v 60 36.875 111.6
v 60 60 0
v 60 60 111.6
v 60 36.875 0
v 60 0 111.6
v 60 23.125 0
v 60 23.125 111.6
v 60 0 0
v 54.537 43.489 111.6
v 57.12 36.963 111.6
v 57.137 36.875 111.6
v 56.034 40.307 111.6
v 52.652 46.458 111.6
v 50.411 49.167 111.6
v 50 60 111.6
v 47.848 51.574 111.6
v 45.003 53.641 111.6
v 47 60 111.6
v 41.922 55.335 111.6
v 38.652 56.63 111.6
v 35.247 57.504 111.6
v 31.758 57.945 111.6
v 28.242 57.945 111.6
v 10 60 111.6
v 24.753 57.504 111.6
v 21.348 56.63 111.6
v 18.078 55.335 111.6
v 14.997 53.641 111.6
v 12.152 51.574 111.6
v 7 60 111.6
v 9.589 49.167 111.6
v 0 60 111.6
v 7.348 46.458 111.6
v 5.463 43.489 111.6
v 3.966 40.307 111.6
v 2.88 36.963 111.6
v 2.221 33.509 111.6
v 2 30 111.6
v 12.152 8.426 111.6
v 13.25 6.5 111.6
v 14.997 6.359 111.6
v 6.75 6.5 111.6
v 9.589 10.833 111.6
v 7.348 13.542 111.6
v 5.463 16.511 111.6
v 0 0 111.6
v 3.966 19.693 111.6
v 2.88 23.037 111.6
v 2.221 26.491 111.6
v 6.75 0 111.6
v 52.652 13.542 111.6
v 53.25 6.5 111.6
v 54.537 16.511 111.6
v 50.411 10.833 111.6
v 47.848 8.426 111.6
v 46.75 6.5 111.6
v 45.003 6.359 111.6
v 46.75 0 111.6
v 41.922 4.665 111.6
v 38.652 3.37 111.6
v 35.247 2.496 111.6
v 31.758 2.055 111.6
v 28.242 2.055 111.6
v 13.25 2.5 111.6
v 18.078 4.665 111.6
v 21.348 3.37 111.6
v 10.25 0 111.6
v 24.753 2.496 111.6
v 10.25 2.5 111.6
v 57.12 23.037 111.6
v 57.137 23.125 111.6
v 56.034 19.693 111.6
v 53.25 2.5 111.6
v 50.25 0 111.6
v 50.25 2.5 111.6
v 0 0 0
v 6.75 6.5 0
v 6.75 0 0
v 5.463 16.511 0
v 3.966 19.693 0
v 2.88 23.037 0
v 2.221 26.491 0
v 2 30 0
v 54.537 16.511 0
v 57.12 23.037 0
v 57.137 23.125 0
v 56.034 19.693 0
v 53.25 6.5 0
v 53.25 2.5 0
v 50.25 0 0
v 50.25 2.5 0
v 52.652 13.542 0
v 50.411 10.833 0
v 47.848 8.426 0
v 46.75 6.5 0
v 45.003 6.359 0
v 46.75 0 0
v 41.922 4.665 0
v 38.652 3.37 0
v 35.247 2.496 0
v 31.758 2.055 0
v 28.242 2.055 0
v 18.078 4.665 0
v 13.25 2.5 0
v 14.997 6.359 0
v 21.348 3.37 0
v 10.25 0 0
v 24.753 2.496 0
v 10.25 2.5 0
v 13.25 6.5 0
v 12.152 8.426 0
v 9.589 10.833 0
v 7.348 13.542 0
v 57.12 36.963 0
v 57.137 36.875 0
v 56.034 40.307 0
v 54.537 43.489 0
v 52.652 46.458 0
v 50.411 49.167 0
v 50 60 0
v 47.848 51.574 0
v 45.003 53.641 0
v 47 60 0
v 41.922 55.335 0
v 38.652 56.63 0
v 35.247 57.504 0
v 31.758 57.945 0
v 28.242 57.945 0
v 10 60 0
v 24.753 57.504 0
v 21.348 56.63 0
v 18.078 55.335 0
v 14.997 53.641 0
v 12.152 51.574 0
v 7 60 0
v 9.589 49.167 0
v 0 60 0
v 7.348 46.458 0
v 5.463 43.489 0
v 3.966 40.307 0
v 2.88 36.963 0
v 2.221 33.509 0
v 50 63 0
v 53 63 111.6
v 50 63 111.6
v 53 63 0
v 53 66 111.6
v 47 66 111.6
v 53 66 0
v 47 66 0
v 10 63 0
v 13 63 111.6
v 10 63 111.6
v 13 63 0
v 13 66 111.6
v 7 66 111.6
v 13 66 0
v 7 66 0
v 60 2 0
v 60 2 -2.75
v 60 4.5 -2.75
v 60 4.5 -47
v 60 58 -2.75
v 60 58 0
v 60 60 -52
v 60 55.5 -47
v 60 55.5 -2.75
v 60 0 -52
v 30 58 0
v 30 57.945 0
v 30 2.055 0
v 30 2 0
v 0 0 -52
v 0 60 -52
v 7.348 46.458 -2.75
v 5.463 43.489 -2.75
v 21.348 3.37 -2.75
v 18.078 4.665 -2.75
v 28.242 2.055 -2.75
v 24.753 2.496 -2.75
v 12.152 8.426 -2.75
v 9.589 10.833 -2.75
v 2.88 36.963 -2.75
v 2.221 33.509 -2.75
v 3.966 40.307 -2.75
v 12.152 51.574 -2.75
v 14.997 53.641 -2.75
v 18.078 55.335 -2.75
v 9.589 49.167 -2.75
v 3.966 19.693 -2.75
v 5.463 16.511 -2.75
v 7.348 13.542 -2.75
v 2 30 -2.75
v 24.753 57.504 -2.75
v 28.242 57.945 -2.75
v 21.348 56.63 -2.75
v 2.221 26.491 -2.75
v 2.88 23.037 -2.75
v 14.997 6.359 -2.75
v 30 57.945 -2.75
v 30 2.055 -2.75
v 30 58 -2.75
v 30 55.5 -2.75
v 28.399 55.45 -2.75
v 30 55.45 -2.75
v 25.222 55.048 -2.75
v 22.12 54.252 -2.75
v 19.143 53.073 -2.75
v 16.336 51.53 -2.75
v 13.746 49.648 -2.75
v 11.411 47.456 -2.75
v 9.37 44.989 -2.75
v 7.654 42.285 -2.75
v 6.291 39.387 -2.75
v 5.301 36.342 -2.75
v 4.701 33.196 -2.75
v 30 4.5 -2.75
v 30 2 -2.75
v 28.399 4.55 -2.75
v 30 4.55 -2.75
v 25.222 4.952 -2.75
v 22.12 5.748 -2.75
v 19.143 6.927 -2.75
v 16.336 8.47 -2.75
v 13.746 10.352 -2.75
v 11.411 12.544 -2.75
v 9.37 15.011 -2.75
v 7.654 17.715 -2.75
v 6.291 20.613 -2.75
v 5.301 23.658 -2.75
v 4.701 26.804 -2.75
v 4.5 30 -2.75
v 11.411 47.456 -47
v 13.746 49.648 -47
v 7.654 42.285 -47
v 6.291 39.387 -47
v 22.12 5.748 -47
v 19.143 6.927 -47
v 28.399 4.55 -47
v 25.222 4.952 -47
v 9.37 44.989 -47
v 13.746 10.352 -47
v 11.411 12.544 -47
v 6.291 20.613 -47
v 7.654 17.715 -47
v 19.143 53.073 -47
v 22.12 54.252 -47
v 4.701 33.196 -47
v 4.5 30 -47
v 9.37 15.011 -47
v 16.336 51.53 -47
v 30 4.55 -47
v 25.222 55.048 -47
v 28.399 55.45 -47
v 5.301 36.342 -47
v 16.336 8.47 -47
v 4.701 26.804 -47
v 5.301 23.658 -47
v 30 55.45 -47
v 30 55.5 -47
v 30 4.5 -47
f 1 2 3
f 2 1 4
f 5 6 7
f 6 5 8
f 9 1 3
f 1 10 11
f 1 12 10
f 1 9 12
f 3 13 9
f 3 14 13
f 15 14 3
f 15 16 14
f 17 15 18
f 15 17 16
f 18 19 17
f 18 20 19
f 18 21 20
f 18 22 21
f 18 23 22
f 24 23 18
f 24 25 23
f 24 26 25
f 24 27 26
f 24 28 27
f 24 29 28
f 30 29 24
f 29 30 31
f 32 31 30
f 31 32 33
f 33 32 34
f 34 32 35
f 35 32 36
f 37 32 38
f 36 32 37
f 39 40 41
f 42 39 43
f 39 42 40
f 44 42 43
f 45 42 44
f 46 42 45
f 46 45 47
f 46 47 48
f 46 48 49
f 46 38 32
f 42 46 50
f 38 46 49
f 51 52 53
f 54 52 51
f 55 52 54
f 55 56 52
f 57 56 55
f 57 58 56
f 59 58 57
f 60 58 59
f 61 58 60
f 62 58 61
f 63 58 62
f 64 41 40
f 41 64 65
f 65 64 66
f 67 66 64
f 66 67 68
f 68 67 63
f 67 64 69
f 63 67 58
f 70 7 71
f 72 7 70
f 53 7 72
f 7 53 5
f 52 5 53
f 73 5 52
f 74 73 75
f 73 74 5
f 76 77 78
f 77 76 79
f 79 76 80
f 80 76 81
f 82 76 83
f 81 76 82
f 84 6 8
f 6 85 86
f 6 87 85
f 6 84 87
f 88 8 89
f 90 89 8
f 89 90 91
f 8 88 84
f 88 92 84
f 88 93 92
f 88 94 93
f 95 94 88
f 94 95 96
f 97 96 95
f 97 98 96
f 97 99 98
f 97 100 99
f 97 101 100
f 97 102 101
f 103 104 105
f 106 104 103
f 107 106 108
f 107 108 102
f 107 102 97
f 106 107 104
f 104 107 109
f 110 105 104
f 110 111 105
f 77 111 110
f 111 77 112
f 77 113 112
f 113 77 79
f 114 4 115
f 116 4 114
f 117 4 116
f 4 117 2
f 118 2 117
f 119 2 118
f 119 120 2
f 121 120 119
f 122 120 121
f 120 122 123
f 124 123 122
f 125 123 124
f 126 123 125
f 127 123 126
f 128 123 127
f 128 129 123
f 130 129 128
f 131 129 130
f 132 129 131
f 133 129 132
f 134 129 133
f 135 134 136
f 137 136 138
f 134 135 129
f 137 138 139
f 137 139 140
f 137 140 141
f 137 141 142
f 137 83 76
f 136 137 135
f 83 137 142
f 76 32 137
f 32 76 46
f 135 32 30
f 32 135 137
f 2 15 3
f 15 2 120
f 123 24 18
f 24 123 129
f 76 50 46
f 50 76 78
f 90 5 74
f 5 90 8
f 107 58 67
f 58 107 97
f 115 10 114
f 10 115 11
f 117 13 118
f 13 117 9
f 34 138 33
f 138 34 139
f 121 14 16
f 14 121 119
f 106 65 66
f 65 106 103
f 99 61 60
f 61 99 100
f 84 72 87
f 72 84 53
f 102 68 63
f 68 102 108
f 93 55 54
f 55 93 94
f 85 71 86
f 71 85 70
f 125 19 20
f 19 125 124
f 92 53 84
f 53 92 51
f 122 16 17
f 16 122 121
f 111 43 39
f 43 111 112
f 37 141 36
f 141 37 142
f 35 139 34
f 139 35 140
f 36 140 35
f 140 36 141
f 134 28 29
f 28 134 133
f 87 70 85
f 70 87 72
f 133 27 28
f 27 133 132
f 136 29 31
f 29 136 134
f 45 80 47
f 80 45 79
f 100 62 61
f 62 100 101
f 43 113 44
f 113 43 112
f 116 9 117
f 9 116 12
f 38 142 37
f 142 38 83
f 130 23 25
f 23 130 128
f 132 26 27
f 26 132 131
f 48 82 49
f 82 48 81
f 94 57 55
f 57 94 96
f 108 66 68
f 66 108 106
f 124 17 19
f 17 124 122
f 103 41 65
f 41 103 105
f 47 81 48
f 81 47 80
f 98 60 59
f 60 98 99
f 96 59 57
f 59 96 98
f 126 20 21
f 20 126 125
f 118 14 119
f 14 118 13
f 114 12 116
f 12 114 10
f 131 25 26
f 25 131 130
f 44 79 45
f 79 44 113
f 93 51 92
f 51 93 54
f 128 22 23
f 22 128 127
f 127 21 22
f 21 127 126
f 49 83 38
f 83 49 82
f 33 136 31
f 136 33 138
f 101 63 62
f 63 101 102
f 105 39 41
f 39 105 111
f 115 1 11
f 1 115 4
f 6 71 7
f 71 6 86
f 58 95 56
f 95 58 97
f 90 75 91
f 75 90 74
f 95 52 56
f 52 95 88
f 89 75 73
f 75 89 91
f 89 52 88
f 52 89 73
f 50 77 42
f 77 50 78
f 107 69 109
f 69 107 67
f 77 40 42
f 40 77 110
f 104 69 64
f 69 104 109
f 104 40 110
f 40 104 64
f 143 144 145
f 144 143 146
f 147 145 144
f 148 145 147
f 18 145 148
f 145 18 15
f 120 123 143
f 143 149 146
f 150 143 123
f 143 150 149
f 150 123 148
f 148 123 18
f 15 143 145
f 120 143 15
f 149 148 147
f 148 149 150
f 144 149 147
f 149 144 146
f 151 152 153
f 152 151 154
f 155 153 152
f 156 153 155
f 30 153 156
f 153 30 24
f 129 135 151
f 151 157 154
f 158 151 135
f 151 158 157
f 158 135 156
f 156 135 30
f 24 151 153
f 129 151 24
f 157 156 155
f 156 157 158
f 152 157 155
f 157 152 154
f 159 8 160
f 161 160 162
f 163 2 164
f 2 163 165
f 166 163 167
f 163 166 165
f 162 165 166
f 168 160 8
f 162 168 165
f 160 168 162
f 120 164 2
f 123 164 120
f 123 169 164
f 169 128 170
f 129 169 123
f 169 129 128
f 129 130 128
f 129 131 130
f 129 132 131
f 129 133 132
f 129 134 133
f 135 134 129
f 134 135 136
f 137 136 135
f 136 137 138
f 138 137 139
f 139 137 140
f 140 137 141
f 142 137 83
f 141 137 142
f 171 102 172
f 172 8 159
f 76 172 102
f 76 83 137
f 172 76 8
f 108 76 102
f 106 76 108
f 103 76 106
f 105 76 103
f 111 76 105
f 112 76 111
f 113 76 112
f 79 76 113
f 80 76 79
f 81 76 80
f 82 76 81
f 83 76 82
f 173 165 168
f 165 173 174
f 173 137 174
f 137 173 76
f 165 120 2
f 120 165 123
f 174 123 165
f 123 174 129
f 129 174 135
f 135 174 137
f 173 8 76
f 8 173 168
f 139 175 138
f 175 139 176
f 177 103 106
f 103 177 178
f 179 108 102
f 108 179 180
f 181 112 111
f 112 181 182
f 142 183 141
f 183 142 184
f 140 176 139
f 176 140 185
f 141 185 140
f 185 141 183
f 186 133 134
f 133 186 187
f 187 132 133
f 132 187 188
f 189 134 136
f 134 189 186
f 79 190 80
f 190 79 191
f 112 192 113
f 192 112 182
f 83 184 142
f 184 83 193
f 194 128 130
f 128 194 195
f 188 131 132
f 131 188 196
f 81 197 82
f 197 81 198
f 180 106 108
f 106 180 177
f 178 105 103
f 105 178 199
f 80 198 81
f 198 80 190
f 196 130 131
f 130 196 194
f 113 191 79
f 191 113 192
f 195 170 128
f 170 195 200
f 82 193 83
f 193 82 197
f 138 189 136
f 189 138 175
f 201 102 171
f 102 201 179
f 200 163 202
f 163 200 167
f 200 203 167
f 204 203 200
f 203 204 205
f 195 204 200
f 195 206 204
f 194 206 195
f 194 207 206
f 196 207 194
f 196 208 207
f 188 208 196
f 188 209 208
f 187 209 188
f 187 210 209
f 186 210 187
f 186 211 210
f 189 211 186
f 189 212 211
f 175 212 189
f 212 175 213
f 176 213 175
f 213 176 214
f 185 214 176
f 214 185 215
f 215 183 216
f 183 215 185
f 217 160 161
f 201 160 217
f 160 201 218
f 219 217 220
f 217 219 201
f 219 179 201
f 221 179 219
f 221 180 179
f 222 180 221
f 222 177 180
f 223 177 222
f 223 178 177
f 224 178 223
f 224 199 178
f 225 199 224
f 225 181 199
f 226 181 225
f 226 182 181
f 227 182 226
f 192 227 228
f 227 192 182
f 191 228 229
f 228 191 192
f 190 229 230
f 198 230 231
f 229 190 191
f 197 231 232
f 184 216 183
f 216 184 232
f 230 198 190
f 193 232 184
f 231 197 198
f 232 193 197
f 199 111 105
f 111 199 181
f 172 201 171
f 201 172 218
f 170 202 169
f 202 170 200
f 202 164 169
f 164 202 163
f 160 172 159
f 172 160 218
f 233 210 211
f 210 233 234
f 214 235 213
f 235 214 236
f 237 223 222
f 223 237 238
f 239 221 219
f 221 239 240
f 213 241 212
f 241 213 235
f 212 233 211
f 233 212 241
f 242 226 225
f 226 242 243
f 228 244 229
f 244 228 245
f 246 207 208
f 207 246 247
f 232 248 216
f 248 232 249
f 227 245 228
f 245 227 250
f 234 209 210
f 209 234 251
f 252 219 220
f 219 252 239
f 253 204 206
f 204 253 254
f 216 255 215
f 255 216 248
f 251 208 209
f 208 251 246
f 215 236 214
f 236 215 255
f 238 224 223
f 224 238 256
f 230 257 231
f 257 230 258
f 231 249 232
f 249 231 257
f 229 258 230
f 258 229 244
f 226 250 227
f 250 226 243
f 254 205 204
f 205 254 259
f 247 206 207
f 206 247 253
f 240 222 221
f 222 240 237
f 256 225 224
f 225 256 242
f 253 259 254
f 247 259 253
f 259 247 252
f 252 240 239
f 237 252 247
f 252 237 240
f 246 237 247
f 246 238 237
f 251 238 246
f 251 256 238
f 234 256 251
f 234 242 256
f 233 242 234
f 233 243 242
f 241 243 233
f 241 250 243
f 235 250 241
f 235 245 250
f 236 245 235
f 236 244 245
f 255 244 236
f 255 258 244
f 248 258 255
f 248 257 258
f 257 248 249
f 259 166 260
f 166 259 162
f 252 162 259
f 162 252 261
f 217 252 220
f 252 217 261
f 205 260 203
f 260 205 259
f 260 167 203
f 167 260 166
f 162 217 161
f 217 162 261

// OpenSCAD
/* [Assembly] */

// Is the capsule holder an assemblable thing (true) or not (false)
is_assemblable = 1; // [1:true, 0:false]
// Is the capsule holder a starting piece (true) or an end/middle piece (false)
is_starter = 1; // [1:true, 0:false]
// Is the capsule holder an end piece (true) or a starting/middle piece (false)
is_end = 0; // [1:true, 0:false]

/* [Size & look] */

// Should this piece have a bottom box to grab the capsules (false) or is it just an extension tower (true)
tower_only = 0; // [1:true, 0:false]
// How many caps in total should the holder contain?
nb_caps = 4;

/* [Capsule Info] */

// Height of the capsule
capsule_height = 37;
// Radius of the lid of the capsule
capsule_cap_diameter = 55;
// Radius of the capsule without the lid
capsule_cap_under_diameter = 51;

/* [Other] */

// Size of the clips (should not be modified unless you see there is a problem with the clips)
clips_thickness = 3;

/* [Hidden] */

assemblable = is_assemblable == 1;
starter = assemblable && (is_starter == 1);
end = assemblable && (is_end == 1) && !starter;

module clip_male(height){
	rotate([0,0,90]){
	cube([clips_thickness,clips_thickness,height]);
	translate([clips_thickness + (clips_thickness/2.0) ,0 , height/2.0]) cube([clips_thickness,2*clips_thickness,height], center = true);
	}
}

module clip_female(height){
	rotate([0,0,90]){
	translate([0, -0.25, 0])cube([clips_thickness, clips_thickness + 0.5 , height]);
	translate([clips_thickness - 0.5, -(clips_thickness + 0.25), 0]) cube([clips_thickness + 1,(2*clips_thickness) + 0.5,height]);
	}
}

module chemney_by_nb_caps(nb_caps){
	size_z = (capsule_height + 0.2) * (nb_caps);
	chemney_by_size(size_z);
}

module chemney_by_size(height){
	translate([ (capsule_cap_diameter + 5) /2.0, (capsule_cap_diameter + 5) /2.0 , 0]){
	difference(){
		translate([0,0,height/2.0])difference(){
			cube([capsule_cap_diameter + 5, capsule_cap_diameter + 5, height], center = true);
			cylinder(r = capsule_cap_diameter/2.0 + 0.5, h=height, center = true, $fn = 50);
			translate([2.5,0,0])cube([capsule_cap_diameter , capsule_cap_diameter / 4.0, height], center = true);
		}

		if(assemblable || starter){ //add clip holes
			translate([0, -(capsule_cap_diameter + 5) / 2.0, 0]){
				translate([(capsule_cap_diameter + 25) / 4.0 ,0,0])clip_female(height);
				translate([-(capsule_cap_diameter + 25) / 4.0 ,0,0])clip_female(height);
			}
		}
	}
	if(assemblable || end){ //add clips
		translate([0, (capsule_cap_diameter + 5) / 2.0, 0]){
			translate([(capsule_cap_diameter + 25) / 4.0 ,0,0])clip_male(height);
			translate([-(capsule_cap_diameter + 25) / 4.0 ,0,0])clip_male(height);
		}
	}
	}
}



chemney_by_nb_caps(nb_caps - (-1*(tower_only-1)));
// and now for the base
if (tower_only == 0){
translate([0,0, -(capsule_height + 15)])translate([(capsule_cap_diameter +5)/2.0, (capsule_cap_diameter +5)/2.0, (capsule_height + 15)/2.0])difference(){
	cube([capsule_cap_diameter +5, capsule_cap_diameter +5, capsule_height + 15], center = true);

	translate([0,0,(capsule_height + 12.5)/2.0])
		cylinder(r = (capsule_cap_diameter + 1) /2.0, h=3, center = true, $fn = 50);
	translate([(capsule_cap_diameter  + 1) / 2.0, 0 , (capsule_height + 12.5)/2.0])
		cube([capsule_cap_diameter + 1, capsule_cap_diameter + 1, 3], center = true);

	translate([0,0,5/2.0])
		cylinder(r = (capsule_cap_under_diameter) /2.0, h=capsule_height + 10, center = true, $fn = 50);
	translate([(capsule_cap_under_diameter) / 2.0, 0 , 5/2.0])
		cube([capsule_cap_under_diameter, capsule_cap_under_diameter, capsule_height + 10], center = true);
}
}
